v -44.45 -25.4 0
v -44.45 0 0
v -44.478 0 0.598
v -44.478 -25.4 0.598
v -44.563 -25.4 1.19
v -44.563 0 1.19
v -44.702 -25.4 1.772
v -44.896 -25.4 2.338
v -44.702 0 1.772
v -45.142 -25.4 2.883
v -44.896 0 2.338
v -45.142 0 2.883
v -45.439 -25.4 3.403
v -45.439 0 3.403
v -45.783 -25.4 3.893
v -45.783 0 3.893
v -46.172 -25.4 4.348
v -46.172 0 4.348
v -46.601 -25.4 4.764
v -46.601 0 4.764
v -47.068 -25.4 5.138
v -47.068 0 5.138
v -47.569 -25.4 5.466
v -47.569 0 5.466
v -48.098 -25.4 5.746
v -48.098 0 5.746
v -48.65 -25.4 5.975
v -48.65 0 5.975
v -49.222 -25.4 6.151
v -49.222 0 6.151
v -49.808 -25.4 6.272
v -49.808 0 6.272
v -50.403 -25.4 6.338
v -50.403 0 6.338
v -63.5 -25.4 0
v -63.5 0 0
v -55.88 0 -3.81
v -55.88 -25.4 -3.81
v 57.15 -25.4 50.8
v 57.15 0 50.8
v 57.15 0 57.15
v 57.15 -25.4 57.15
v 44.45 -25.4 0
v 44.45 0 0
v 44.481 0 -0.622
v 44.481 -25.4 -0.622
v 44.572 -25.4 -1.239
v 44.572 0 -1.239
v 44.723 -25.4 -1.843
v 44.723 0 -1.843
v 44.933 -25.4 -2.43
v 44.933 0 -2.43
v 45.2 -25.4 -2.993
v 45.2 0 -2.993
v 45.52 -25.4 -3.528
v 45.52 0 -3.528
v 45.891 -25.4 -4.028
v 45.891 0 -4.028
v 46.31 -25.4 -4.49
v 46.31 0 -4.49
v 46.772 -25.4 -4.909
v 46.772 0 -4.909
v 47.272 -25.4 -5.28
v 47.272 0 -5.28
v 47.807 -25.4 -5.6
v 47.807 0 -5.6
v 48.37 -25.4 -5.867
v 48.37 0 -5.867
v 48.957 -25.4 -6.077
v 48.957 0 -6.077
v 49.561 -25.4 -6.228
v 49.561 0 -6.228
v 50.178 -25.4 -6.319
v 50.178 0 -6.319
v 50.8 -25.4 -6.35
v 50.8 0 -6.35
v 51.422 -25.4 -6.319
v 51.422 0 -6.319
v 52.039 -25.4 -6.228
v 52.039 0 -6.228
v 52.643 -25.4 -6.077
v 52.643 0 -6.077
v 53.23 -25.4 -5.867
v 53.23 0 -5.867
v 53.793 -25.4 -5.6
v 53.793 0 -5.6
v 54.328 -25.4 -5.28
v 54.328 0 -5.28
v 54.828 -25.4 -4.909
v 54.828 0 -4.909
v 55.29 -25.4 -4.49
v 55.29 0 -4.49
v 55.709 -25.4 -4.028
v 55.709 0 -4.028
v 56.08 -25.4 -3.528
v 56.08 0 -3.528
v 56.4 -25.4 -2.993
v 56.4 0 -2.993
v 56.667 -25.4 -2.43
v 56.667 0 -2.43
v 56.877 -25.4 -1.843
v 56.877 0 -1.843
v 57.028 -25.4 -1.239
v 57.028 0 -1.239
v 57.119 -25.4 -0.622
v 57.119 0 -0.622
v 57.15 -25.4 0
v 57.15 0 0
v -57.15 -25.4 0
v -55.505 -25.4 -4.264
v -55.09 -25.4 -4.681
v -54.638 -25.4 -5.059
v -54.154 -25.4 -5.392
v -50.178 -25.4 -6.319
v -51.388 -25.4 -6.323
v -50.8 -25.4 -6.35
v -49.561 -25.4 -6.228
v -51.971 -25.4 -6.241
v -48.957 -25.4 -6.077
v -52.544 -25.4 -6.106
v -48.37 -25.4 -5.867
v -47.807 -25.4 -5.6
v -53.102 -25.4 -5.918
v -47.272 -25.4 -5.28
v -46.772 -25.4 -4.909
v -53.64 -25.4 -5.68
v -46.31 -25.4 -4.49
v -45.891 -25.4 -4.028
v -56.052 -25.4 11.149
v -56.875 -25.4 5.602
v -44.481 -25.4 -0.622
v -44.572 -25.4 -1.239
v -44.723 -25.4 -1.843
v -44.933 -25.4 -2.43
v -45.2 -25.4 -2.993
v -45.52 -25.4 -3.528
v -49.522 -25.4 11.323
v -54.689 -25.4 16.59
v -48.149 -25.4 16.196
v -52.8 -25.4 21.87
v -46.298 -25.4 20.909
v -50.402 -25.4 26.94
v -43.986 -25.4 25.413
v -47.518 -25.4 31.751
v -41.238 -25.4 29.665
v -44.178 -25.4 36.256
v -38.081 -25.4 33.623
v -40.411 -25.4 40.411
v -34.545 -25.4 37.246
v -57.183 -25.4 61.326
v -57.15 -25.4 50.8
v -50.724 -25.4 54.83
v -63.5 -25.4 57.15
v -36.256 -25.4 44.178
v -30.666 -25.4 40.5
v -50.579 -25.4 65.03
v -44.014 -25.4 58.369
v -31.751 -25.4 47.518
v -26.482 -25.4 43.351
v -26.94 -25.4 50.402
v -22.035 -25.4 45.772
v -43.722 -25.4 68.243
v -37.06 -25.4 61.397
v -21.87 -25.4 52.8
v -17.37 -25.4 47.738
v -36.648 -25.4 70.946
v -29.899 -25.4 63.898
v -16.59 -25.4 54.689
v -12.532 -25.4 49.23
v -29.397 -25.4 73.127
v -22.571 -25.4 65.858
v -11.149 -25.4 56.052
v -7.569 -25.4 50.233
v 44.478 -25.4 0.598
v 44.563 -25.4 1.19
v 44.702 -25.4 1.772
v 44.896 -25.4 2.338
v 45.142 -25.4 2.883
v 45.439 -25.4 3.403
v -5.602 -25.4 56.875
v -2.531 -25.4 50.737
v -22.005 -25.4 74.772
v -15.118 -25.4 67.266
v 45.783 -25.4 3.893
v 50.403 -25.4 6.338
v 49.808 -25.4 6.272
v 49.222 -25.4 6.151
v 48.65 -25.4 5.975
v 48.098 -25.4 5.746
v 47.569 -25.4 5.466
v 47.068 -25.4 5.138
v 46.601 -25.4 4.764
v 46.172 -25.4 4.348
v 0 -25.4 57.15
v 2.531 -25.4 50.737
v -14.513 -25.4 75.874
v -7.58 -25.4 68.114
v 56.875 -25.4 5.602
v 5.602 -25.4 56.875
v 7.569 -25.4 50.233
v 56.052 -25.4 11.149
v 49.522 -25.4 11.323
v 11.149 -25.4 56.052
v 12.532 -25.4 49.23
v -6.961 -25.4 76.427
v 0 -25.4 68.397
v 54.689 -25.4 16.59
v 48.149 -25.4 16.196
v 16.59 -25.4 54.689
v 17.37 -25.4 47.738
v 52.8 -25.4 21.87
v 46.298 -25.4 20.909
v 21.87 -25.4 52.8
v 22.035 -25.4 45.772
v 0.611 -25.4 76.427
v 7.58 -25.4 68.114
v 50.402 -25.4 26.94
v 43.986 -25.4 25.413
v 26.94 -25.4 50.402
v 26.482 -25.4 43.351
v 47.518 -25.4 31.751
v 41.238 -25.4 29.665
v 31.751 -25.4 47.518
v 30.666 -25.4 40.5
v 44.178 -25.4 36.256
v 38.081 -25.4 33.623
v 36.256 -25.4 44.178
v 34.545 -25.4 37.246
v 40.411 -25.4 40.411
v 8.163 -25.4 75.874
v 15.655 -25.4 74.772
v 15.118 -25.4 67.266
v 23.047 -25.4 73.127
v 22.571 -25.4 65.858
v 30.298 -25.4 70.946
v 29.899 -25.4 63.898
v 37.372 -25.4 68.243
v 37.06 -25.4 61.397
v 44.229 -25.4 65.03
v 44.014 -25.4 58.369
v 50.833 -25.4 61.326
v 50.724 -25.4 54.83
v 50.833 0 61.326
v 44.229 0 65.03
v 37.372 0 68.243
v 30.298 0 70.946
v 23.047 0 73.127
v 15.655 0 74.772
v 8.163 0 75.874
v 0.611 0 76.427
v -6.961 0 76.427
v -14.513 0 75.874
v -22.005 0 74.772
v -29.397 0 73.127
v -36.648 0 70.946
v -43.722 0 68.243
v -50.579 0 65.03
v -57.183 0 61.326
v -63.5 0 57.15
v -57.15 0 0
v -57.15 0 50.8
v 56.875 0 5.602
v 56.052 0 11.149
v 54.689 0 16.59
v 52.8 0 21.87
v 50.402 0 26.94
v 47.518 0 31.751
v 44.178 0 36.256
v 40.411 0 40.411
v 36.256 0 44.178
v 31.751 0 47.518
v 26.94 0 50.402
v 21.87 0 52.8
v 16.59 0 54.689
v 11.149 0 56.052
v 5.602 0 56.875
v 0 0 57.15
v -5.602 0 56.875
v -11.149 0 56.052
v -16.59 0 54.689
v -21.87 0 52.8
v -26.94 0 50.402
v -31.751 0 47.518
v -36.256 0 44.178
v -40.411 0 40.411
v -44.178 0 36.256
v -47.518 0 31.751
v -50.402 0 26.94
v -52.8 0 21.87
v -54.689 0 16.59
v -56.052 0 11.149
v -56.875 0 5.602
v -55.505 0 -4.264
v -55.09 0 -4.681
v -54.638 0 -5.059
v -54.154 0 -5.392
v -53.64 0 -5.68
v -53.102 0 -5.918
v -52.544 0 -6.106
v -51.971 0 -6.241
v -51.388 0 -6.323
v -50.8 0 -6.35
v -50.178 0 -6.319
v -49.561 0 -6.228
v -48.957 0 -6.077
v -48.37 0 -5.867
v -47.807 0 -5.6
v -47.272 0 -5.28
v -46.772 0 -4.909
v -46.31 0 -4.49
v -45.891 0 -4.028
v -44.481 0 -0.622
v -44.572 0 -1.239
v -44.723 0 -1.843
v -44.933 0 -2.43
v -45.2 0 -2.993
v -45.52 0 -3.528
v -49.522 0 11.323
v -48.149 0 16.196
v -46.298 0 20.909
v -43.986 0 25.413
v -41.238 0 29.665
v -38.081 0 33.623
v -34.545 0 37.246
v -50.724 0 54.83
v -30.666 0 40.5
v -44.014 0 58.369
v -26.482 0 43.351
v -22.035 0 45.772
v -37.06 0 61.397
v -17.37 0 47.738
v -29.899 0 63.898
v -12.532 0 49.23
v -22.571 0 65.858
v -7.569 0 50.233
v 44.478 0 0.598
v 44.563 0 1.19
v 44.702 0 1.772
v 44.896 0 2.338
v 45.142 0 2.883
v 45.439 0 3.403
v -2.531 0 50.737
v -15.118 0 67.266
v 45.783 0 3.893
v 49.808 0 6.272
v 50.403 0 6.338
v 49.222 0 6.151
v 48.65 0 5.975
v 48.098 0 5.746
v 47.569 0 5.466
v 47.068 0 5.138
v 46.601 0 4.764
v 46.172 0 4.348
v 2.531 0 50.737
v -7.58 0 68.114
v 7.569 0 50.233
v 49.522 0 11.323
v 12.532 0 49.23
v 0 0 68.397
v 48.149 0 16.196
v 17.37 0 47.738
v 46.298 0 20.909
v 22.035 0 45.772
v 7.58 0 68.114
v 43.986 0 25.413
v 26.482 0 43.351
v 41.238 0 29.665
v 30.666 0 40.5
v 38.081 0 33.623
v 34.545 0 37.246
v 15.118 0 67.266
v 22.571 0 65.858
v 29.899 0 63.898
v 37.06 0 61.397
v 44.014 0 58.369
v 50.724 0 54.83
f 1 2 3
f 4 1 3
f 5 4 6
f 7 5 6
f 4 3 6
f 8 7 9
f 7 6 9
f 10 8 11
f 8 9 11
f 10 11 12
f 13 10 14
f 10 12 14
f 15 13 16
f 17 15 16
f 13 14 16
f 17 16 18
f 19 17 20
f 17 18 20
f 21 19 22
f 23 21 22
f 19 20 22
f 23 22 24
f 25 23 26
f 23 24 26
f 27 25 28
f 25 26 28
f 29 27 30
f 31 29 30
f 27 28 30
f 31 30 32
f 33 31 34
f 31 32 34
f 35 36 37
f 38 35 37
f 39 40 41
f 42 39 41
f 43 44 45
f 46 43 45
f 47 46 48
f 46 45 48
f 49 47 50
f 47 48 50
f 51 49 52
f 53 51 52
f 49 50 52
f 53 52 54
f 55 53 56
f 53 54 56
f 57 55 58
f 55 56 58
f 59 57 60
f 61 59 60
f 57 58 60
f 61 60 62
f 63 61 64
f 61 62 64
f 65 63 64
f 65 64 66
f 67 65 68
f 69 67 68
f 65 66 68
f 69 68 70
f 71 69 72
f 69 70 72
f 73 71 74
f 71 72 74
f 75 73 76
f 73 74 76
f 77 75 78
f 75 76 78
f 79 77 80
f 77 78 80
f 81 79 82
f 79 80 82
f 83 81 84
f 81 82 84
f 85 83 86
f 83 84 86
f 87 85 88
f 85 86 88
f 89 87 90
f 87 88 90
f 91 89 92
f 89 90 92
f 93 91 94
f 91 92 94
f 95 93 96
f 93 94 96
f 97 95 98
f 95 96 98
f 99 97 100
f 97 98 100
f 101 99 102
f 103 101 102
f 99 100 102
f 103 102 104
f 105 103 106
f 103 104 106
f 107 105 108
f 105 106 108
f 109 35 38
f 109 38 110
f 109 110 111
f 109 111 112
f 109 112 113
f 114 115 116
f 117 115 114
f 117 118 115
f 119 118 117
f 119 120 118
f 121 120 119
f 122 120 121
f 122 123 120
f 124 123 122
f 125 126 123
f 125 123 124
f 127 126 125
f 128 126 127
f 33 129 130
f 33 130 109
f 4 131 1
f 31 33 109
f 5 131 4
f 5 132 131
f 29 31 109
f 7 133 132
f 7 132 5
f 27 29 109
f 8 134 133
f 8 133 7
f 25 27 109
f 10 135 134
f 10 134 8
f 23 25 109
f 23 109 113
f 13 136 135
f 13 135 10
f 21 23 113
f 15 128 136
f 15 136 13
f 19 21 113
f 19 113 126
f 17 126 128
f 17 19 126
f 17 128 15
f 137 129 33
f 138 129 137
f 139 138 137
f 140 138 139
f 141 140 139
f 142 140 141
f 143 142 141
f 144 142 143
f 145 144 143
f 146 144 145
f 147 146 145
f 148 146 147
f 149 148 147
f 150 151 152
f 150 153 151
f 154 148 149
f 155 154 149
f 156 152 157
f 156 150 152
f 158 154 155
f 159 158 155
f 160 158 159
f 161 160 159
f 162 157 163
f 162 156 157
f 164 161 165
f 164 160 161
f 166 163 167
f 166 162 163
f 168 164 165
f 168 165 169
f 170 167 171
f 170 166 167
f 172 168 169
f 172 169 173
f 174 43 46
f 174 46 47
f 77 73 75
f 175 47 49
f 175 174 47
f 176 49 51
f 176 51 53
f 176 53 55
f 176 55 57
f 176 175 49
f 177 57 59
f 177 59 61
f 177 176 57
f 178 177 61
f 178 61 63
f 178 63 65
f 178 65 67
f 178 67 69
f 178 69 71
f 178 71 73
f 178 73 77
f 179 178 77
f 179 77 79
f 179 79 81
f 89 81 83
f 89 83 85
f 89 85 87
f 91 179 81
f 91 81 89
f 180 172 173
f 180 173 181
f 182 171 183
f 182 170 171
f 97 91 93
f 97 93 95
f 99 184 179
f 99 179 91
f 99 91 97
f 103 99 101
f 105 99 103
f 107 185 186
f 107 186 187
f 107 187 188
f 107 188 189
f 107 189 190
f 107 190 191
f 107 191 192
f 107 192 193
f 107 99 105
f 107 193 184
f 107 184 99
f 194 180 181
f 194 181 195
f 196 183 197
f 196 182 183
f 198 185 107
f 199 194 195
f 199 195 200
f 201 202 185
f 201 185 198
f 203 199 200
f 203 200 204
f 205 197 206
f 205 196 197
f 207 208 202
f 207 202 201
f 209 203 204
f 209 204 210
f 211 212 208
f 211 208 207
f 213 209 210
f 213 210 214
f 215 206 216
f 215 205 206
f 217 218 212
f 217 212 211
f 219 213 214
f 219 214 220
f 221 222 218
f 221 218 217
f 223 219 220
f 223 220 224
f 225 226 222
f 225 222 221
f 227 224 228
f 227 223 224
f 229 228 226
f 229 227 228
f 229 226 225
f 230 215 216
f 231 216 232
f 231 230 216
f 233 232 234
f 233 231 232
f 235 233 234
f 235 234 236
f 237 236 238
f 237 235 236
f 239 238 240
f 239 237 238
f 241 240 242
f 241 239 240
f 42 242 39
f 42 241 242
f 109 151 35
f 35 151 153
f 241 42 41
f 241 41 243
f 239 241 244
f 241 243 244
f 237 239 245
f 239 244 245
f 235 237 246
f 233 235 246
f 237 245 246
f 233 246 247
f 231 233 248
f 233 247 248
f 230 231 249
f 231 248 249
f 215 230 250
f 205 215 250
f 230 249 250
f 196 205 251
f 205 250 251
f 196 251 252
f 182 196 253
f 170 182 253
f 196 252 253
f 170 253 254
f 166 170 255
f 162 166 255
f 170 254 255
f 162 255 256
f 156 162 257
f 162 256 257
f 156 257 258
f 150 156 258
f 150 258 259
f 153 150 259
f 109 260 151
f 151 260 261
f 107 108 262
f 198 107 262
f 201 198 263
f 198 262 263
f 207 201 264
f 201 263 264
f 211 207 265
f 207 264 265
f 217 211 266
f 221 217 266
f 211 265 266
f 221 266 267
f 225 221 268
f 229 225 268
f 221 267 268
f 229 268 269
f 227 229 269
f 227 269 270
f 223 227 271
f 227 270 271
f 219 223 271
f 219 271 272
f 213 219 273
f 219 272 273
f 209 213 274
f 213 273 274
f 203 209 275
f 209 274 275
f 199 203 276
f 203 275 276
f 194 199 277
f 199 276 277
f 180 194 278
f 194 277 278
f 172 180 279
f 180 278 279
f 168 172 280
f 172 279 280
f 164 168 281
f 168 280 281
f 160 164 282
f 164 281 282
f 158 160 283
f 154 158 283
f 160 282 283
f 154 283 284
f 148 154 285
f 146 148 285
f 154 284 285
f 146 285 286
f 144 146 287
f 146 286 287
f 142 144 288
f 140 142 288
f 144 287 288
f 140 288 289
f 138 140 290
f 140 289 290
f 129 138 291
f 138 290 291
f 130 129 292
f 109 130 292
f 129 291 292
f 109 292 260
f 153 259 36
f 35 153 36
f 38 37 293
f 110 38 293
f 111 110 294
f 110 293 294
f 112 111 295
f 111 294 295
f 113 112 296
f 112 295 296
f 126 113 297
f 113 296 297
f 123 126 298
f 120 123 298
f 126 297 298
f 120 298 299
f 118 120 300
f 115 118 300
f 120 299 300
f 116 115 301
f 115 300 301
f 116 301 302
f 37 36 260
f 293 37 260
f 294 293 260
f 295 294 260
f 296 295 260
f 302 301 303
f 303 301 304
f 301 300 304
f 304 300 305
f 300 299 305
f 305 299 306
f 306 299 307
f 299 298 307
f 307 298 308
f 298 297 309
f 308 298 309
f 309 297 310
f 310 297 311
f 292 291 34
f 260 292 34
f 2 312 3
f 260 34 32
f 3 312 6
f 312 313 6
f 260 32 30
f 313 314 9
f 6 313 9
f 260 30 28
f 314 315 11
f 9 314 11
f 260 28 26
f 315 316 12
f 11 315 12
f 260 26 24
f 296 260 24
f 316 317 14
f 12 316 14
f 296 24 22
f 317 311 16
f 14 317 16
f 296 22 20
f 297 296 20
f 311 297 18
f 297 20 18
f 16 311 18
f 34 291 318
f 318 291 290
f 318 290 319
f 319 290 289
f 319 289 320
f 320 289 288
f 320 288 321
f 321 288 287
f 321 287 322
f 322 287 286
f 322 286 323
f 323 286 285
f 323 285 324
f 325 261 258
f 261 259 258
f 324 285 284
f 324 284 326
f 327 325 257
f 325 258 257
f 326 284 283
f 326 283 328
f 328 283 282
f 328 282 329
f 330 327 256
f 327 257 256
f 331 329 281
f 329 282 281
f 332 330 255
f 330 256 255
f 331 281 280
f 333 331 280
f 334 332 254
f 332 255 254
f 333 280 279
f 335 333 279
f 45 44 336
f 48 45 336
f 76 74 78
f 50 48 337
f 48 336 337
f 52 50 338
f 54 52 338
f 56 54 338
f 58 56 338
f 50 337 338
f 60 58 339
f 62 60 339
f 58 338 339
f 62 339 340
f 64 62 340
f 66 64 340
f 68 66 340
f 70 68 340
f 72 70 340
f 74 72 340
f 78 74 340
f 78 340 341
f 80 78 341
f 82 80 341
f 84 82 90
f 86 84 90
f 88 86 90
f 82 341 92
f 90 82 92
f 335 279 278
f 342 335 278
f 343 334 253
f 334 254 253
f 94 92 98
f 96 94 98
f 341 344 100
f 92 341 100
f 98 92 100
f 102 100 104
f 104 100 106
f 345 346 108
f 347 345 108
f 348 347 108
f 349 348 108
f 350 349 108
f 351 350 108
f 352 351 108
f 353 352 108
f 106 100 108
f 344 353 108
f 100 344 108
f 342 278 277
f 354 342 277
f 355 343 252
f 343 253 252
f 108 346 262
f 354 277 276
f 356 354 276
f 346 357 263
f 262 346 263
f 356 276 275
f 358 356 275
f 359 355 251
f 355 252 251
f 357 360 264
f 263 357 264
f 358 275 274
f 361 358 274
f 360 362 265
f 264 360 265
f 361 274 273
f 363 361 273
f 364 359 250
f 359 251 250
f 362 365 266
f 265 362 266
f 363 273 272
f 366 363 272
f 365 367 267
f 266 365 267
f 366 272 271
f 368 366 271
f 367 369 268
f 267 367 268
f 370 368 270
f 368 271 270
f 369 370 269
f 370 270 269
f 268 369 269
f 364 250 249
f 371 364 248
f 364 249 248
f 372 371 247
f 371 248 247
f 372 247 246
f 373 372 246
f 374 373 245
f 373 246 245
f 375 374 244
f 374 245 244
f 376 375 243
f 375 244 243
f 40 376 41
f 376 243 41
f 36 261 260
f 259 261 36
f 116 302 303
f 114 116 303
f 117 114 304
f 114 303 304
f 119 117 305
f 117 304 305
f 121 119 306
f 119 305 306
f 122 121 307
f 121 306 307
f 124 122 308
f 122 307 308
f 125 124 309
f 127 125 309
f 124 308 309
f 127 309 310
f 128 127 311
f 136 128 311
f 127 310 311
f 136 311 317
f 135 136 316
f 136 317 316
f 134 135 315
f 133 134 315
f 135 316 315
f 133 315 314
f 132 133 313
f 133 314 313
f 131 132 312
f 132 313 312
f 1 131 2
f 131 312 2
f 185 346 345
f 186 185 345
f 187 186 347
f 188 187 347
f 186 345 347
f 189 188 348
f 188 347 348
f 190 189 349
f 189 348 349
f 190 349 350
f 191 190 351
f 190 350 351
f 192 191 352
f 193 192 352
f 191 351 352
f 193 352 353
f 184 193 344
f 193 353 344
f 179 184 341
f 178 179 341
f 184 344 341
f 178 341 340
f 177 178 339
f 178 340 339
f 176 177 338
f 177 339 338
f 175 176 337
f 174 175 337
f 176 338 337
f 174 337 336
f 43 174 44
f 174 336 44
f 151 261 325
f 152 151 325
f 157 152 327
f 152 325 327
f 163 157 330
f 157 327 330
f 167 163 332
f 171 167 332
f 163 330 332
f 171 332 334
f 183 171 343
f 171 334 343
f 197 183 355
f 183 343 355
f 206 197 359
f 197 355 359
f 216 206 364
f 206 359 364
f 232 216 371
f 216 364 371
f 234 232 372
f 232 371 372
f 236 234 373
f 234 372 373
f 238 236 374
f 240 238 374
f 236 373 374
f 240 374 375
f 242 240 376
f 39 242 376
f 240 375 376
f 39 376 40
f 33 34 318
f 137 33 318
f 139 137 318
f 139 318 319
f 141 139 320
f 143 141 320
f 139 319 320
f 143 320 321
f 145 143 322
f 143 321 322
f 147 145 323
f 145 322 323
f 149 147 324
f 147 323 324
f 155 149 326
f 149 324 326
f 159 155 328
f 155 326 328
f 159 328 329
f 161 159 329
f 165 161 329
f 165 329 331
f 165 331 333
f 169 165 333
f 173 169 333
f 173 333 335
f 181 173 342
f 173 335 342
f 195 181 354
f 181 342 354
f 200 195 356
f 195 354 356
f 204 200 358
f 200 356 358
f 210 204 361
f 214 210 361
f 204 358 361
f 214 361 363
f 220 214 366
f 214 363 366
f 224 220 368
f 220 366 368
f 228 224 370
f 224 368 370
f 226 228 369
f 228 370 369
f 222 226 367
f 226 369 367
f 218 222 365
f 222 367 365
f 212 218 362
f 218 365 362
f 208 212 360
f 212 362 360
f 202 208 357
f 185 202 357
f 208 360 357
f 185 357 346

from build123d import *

# Parameters (mm, degrees)
F1_DEPTH = 25.4


with BuildPart() as f1:
    # F0 (on Front) → F1 (new body)
    with BuildSketch(Plane.XZ):
        with BuildLine():
            Line((-63.5, 0), (-57.15, 0))
            Line((-57.15, 0), (-57.15, 50.8))
            ThreePointArc((-57.15, 50.8), (0, 68.3973958737), (57.15, 50.8))
            Line((57.15, 50.8), (57.15, 57.15))
            ThreePointArc((57.15, 57.15), (-3.175, 76.495759208), (-63.5, 57.15))
            Line((-63.5, 57.15), (-63.5, 0))
        make_face()
        with BuildLine():
            ThreePointArc((-50.8, -6.35), (-46.3098719395, -4.4901280605), (-44.45, 0))
            Line((-44.45, 0), (-50.8, 0))
            ThreePointArc((-50.8, 0), (-50.700684167, 3.175), (-50.403125, 6.3375855209))
            ThreePointArc((-50.403125, 6.3375855209), (-55.1475478002, 4.6283180665), (-57.15, 0))
            ThreePointArc((-57.15, 0), (-56.8241389426, -2.0080463142), (-55.88, -3.81))
            Line((-55.88, -3.81), (-50.8, -6.35))
        make_face()
        with BuildLine():
            ThreePointArc((-57.15, 0), (-55.1475478002, 4.6283180665), (-50.403125, 6.3375855209))
            ThreePointArc((-50.403125, 6.3375855209), (0, 50.8), (50.403125, 6.3375855209))
            ThreePointArc((50.403125, 6.3375855209), (55.1475478002, 4.6283180665), (57.15, 0))
            ThreePointArc((57.15, 0), (0, 57.15), (-57.15, 0))
        make_face()
        with BuildLine():
            Line((-50.8, 0), (-44.45, 0))
            ThreePointArc((-44.45, 0), (-46.1716819335, 4.3475478002), (-50.403125, 6.3375855209))
            ThreePointArc((-50.403125, 6.3375855209), (-50.700684167, 3.175), (-50.8, 0))
        make_face()
        with BuildLine():
            ThreePointArc((50.403125, 6.3375855209), (46.1716819335, 4.3475478002), (44.45, 0))
            Line((44.45, 0), (50.8, 0))
            ThreePointArc((50.8, 0), (50.700684167, 3.175), (50.403125, 6.3375855209))
        make_face()
        with BuildLine():
            Line((50.8, 0), (44.45, 0))
            ThreePointArc((44.45, 0), (50.8, -6.35), (57.15, 0))
            ThreePointArc((57.15, 0), (55.1475478002, 4.6283180665), (50.403125, 6.3375855209))
            ThreePointArc((50.403125, 6.3375855209), (50.700684167, 3.175), (50.8, 0))
        make_face()
        with BuildLine():
            Line((-63.5, 0), (-55.88, -3.81))
            ThreePointArc((-55.88, -3.81), (-56.8241389426, -2.0080463142), (-57.15, 0))
            Line((-57.15, 0), (-63.5, 0))
        make_face()
        with BuildLine():
            ThreePointArc((-55.88, -3.81), (-53.6398063314, -5.6796126628), (-50.8, -6.35))
            Line((-50.8, -6.35), (-55.88, -3.81))
        make_face()
    extrude(amount=F1_DEPTH)


solid = f1.part
